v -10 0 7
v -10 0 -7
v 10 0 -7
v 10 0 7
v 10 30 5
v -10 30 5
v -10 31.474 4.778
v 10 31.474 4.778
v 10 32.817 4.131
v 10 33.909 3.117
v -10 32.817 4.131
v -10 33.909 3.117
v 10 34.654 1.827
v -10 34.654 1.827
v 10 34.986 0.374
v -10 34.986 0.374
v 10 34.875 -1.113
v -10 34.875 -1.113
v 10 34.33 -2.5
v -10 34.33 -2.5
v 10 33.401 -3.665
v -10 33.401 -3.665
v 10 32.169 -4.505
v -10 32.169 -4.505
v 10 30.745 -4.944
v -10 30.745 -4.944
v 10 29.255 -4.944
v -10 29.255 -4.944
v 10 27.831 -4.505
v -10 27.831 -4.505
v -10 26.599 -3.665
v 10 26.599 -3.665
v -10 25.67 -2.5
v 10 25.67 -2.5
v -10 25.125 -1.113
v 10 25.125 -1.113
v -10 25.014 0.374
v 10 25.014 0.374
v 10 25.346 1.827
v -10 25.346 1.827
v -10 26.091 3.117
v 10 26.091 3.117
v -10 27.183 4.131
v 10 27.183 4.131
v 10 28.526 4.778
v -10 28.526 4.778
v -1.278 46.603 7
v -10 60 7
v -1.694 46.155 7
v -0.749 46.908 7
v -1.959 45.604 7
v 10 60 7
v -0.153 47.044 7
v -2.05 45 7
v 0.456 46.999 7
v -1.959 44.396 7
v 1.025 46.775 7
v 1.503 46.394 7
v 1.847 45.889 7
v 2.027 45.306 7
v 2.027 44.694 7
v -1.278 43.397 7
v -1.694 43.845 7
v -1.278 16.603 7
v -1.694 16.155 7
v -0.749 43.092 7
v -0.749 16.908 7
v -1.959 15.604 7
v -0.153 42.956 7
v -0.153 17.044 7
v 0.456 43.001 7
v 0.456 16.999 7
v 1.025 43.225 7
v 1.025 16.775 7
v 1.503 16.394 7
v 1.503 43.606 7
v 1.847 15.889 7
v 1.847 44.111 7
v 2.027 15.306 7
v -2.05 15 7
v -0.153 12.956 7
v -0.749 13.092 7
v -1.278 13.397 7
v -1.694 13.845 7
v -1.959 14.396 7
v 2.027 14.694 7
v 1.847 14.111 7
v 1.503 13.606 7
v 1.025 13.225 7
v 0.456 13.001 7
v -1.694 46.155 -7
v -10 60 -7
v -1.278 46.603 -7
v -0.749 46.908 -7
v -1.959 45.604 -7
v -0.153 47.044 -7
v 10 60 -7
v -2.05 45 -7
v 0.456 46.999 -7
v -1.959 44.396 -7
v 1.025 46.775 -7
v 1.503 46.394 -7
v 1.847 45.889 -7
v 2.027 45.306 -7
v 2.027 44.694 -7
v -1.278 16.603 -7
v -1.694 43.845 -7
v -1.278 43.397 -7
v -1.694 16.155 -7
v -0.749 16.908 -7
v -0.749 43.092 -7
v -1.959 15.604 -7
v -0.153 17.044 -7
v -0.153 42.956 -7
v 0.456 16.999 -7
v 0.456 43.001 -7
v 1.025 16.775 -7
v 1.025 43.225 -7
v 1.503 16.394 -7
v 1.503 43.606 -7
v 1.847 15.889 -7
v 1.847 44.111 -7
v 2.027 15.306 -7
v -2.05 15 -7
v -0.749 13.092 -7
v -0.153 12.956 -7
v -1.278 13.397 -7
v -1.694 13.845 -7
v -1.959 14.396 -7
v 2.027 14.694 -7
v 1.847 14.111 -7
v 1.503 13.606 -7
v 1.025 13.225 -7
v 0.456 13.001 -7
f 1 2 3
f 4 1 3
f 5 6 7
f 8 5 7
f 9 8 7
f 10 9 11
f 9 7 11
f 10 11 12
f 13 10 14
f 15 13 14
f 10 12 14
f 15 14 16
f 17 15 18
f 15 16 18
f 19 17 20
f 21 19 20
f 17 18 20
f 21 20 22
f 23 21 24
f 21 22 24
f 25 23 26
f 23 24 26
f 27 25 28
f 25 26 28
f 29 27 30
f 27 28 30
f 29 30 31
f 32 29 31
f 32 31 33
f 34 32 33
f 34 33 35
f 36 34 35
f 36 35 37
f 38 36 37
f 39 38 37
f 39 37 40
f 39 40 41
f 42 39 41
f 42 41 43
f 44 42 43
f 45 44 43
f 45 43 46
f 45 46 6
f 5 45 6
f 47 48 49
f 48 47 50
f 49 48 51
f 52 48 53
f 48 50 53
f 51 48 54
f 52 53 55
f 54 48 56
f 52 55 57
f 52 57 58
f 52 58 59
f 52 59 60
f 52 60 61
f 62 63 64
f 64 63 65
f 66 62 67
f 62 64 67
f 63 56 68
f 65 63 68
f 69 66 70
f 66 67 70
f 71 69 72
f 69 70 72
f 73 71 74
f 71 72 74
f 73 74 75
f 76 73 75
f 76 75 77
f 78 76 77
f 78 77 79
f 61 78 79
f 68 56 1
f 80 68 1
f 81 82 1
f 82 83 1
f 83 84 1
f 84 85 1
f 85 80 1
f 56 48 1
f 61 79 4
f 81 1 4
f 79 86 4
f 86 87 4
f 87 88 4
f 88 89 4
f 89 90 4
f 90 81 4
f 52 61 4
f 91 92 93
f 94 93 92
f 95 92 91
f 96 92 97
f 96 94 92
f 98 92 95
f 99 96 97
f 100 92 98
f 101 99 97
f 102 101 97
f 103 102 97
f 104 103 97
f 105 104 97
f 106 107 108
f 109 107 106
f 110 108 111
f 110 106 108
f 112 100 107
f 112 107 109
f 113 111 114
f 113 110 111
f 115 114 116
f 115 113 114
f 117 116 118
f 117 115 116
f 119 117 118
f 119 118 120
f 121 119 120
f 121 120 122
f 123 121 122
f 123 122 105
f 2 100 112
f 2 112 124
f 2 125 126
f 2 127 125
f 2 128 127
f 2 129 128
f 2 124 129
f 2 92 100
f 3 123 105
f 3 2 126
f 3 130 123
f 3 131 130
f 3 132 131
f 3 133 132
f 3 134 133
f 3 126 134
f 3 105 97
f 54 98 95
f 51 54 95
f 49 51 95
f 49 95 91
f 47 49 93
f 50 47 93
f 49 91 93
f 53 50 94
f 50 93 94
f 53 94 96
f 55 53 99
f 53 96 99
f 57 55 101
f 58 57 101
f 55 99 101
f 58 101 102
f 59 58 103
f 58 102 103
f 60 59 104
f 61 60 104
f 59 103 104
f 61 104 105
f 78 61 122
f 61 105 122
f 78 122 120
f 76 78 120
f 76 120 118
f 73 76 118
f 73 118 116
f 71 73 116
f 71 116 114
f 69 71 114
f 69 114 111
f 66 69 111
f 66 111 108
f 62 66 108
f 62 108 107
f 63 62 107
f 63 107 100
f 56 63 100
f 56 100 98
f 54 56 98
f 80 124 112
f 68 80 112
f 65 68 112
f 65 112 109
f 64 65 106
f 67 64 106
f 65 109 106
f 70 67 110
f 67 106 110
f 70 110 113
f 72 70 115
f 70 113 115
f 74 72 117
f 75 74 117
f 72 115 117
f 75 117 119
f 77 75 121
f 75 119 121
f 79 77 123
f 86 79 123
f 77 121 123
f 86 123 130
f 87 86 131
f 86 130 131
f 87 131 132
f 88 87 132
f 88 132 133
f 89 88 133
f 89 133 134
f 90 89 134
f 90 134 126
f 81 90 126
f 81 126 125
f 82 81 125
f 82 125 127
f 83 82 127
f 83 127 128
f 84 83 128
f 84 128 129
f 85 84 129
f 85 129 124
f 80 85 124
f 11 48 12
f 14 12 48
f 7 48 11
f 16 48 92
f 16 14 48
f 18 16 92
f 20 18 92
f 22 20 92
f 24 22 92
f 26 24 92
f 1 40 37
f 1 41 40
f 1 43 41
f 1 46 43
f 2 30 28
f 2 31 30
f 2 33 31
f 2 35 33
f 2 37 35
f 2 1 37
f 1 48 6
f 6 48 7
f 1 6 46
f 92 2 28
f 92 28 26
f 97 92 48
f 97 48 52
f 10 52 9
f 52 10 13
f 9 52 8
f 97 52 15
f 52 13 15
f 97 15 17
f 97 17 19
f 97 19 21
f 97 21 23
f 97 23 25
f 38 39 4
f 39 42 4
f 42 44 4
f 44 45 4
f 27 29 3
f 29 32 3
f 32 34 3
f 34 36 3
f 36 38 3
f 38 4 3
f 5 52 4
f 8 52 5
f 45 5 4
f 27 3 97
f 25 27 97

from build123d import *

# Parameters (mm, degrees)
SKETCH_1_W          = 20
SKETCH_1_H          = 14
EXTRUDE_1_DEPTH     = 60
CUT_EXTRUDE_1_REACH = 65.632
SKETCH_2_R          = 5
CUT_EXTRUDE_2_REACH = 64.418
SKETCH_3_R          = 2.05


with BuildPart() as part:
    # 草图1 → 凸台-拉伸1 (new body)
    with BuildSketch(Plane(origin=(0, 0, 0), x_dir=(1, 0, 0), z_dir=(0, 1, 0))):
        Rectangle(SKETCH_1_W, SKETCH_1_H)
    extrude(amount=EXTRUDE_1_DEPTH)

    # 草图2 → 切除-拉伸1 (cut, up to next)
    with BuildSketch(Plane.ZY.offset(10), mode=Mode.PRIVATE) as cut_extrude_1_sk1:
        with Locations((0, 30)):
            Circle(SKETCH_2_R)
    cut_extrude_1_tool1 = extrude(cut_extrude_1_sk1.sketch, amount=-CUT_EXTRUDE_1_REACH, mode=Mode.PRIVATE) & part.part
    add(cut_extrude_1_tool1.solids().sort_by_distance((-10, 30, 0))[0], mode=Mode.SUBTRACT)

    # 草图3 → 切除-拉伸2 (cut, up to next)
    with BuildSketch(Plane(origin=(0, 0, -7), x_dir=(-1, 0, 0), z_dir=(0, 0, -1)), mode=Mode.PRIVATE) as cut_extrude_2_sk1:
        with Locations((0, 45)):
            Circle(SKETCH_3_R)
    cut_extrude_2_tool1 = extrude(cut_extrude_2_sk1.sketch, amount=-CUT_EXTRUDE_2_REACH, mode=Mode.PRIVATE) & part.part
    # 草图3 → 切除-拉伸2 (cut, up to next)
    with BuildSketch(Plane(origin=(0, 0, -7), x_dir=(-1, 0, 0), z_dir=(0, 0, -1)), mode=Mode.PRIVATE) as cut_extrude_2_sk2:
        with Locations((0, 15)):
            Circle(SKETCH_3_R)
    cut_extrude_2_tool2 = extrude(cut_extrude_2_sk2.sketch, amount=-CUT_EXTRUDE_2_REACH, mode=Mode.PRIVATE) & part.part
    add(cut_extrude_2_tool1.solids().sort_by_distance((0, 45, -7))[0], mode=Mode.SUBTRACT)
    add(cut_extrude_2_tool2.solids().sort_by_distance((0, 15, -7))[0], mode=Mode.SUBTRACT)


solid = part.part
